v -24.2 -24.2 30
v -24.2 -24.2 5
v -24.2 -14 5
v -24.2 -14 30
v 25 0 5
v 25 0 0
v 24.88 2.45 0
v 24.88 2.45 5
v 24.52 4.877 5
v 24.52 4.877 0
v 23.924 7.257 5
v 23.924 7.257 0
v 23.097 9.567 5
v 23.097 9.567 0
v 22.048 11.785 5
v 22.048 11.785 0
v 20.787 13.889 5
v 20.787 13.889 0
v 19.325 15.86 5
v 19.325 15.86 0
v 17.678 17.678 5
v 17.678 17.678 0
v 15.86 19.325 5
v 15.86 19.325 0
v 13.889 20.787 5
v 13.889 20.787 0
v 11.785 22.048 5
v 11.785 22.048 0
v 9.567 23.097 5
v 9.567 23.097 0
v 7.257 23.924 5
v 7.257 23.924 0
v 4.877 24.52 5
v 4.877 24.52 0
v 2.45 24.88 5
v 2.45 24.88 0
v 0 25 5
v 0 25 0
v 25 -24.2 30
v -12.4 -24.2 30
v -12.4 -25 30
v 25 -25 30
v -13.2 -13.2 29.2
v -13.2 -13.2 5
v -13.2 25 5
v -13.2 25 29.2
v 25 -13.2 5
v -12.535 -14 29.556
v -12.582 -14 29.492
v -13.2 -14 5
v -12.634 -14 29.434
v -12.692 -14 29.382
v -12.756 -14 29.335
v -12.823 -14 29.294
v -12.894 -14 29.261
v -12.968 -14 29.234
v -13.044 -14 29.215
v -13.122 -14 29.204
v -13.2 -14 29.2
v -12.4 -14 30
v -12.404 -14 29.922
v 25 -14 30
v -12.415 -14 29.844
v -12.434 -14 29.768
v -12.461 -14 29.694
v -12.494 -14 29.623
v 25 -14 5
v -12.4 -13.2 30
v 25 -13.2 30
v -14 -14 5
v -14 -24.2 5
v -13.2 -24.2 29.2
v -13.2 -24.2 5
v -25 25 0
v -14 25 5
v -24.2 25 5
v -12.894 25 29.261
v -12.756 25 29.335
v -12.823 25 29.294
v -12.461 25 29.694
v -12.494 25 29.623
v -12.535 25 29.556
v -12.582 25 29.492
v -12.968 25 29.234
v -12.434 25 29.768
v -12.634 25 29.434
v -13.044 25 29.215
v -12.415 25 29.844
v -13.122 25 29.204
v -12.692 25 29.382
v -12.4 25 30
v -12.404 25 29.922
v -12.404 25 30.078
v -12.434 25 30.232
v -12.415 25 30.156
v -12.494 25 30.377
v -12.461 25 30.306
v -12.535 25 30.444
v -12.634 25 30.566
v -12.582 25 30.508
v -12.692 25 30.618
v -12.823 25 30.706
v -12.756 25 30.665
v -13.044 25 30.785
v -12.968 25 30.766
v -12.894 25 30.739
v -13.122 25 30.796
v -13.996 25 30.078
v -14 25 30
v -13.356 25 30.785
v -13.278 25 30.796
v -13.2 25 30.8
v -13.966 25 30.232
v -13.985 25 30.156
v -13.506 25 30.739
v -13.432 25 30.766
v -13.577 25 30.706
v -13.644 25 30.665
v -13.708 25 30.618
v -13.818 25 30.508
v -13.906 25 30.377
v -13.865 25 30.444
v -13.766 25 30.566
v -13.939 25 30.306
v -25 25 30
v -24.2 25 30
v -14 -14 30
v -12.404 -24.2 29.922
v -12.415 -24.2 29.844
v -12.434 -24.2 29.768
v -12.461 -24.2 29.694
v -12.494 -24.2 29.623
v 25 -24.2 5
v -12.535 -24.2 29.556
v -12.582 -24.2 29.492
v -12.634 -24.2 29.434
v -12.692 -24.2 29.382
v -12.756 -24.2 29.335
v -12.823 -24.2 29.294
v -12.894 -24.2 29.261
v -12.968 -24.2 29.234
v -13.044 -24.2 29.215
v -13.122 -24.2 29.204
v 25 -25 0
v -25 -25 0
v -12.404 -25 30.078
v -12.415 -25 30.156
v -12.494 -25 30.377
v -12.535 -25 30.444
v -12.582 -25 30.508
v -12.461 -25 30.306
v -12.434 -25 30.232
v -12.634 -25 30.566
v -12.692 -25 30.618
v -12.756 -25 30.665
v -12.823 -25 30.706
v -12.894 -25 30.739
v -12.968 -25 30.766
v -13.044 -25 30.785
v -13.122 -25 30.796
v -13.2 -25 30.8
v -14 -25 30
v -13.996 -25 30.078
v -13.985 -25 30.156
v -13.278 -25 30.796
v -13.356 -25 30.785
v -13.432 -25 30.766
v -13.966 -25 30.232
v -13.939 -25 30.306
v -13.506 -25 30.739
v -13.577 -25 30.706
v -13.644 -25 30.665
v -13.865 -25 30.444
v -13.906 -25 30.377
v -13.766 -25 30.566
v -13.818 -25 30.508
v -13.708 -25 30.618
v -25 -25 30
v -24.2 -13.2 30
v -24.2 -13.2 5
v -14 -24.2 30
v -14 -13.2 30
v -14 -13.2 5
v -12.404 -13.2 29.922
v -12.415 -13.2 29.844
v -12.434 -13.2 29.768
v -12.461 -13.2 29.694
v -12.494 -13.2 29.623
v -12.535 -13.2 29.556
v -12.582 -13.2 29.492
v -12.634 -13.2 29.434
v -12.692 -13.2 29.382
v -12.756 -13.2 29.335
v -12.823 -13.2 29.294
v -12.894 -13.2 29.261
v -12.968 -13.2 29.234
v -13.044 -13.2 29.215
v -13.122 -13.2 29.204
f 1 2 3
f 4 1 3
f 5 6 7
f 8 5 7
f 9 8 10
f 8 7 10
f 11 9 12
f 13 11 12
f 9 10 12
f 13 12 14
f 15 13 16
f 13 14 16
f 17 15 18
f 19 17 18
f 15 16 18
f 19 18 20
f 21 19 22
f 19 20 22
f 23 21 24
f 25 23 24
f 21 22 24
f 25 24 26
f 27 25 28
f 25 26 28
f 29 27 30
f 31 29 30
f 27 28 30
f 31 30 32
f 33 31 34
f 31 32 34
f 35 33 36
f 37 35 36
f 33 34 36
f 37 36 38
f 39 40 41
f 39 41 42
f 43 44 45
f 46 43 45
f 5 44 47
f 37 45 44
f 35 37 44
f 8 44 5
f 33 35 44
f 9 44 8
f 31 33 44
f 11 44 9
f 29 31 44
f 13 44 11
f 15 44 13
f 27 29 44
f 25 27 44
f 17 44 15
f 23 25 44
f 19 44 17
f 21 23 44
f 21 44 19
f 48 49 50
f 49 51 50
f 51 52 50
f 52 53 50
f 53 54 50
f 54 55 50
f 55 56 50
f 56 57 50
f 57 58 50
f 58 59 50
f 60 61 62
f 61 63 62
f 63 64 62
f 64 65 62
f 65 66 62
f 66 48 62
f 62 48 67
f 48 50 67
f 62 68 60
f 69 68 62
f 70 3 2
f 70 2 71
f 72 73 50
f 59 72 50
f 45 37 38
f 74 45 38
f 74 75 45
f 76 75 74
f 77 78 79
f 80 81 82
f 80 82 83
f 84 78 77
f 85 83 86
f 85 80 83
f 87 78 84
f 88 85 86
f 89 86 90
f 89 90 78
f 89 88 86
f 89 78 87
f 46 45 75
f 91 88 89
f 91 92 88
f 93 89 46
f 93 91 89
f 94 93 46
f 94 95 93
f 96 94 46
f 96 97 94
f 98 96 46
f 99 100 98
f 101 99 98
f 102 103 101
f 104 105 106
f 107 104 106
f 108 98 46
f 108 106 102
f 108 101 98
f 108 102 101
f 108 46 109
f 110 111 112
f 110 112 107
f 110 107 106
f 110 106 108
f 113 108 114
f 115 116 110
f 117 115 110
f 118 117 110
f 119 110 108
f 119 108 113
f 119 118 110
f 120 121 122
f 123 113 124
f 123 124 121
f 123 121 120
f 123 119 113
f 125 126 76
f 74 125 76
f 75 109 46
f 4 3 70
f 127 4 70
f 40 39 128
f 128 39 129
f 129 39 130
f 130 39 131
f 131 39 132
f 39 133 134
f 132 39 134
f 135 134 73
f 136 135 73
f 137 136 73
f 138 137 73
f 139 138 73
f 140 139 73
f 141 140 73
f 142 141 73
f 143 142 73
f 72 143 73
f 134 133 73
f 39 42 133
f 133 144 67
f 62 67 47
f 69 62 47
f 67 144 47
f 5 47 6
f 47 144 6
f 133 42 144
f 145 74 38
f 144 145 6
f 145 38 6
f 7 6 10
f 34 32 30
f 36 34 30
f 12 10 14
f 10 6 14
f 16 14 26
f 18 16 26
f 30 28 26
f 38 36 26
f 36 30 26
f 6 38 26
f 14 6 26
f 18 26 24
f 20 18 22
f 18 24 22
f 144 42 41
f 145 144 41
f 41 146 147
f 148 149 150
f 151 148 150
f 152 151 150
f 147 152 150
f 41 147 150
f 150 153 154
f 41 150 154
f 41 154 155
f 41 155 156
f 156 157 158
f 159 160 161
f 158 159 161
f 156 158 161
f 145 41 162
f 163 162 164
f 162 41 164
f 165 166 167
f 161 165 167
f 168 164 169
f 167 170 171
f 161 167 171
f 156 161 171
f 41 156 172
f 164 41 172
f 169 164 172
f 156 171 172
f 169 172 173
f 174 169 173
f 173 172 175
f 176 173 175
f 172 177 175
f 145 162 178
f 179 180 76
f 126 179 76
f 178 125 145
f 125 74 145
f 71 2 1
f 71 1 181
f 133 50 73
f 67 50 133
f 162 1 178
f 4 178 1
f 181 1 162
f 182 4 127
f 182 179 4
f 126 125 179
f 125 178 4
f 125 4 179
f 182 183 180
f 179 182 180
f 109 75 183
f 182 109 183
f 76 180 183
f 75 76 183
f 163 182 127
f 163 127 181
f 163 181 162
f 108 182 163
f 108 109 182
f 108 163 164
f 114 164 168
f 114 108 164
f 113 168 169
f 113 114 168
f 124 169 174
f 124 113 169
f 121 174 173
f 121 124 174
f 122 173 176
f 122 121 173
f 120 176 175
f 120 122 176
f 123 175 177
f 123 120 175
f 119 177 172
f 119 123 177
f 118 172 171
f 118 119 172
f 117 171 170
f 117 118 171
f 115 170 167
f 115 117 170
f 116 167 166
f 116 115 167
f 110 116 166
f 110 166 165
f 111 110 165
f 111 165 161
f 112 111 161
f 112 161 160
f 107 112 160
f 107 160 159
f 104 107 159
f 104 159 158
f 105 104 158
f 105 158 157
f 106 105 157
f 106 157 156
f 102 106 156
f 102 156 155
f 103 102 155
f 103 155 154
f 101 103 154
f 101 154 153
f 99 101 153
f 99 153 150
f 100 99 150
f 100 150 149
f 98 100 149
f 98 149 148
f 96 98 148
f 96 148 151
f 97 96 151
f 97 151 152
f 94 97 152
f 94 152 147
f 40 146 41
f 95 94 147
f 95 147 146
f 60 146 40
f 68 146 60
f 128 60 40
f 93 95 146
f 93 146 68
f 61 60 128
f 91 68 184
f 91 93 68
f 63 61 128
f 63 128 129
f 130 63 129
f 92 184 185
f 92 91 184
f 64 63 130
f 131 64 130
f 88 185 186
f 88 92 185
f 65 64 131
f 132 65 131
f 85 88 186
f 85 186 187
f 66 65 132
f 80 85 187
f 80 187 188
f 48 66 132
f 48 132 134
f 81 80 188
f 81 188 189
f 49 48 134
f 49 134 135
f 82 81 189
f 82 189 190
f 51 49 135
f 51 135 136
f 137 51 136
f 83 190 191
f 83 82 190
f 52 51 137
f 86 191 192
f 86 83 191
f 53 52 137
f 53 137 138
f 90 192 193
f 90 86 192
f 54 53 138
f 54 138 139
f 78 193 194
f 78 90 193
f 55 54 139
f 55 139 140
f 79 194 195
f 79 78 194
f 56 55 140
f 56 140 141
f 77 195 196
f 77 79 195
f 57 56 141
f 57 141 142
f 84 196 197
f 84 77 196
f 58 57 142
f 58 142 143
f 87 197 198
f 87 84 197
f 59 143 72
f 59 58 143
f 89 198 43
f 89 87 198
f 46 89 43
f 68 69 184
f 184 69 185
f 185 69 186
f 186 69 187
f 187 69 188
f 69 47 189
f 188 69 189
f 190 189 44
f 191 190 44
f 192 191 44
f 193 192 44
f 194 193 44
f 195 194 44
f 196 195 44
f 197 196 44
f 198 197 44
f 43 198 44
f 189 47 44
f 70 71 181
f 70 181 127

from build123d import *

# Parameters (mm, degrees)
F1_DEPTH = 5
F2_W     = 10.2
F2_H     = 10.2
F3_DEPTH = 25
F5_DEPTH = 50


with BuildPart() as f1:
    # F0 (on Top) → F1 (new body)
    with BuildSketch(Plane.XY):
        with BuildLine():
            Line((0, 25), (-25, 25))
            Line((-25, 25), (-25, -25))
            Line((-25, -25), (25, -25))
            Line((25, -25), (25, 0))
            ThreePointArc((25, 0), (17.67767, 17.67767), (0, 25))
        make_face()
    extrude(amount=F1_DEPTH)

    # F2 (on face) → F3 (join)
    with BuildSketch(Plane.XY.offset(5)):
        Polygon((-24.2, -13.2), (-24.2, 25), (-25, 25), (-25, -25), (25, -25), (25, -24.2), (-13.2, -24.2), (-13.2, -14), (25, -14), (25, -13.2), (-13.2, -13.2), (-13.2, 25), (-14, 25), (-14, -13.2), align=None)
        with Locations((-19.1, -19.1)):
            Rectangle(F2_W, F2_H, mode=Mode.SUBTRACT)
    extrude(amount=F3_DEPTH)

    # F4 (on face) → F5 (join)
    with BuildSketch(Plane(origin=(0, 25, 0), x_dir=(-1, 0, 0), z_dir=(0, 1, 0))):
        with BuildLine():
            Line((13.2, 30), (14, 30))
            ThreePointArc((14, 30), (12.634315, 30.565685), (13.2, 29.2))
            Line((13.2, 29.2), (13.2, 30))
        make_face()
    extrude(amount=-F5_DEPTH)


solid = f1.part
